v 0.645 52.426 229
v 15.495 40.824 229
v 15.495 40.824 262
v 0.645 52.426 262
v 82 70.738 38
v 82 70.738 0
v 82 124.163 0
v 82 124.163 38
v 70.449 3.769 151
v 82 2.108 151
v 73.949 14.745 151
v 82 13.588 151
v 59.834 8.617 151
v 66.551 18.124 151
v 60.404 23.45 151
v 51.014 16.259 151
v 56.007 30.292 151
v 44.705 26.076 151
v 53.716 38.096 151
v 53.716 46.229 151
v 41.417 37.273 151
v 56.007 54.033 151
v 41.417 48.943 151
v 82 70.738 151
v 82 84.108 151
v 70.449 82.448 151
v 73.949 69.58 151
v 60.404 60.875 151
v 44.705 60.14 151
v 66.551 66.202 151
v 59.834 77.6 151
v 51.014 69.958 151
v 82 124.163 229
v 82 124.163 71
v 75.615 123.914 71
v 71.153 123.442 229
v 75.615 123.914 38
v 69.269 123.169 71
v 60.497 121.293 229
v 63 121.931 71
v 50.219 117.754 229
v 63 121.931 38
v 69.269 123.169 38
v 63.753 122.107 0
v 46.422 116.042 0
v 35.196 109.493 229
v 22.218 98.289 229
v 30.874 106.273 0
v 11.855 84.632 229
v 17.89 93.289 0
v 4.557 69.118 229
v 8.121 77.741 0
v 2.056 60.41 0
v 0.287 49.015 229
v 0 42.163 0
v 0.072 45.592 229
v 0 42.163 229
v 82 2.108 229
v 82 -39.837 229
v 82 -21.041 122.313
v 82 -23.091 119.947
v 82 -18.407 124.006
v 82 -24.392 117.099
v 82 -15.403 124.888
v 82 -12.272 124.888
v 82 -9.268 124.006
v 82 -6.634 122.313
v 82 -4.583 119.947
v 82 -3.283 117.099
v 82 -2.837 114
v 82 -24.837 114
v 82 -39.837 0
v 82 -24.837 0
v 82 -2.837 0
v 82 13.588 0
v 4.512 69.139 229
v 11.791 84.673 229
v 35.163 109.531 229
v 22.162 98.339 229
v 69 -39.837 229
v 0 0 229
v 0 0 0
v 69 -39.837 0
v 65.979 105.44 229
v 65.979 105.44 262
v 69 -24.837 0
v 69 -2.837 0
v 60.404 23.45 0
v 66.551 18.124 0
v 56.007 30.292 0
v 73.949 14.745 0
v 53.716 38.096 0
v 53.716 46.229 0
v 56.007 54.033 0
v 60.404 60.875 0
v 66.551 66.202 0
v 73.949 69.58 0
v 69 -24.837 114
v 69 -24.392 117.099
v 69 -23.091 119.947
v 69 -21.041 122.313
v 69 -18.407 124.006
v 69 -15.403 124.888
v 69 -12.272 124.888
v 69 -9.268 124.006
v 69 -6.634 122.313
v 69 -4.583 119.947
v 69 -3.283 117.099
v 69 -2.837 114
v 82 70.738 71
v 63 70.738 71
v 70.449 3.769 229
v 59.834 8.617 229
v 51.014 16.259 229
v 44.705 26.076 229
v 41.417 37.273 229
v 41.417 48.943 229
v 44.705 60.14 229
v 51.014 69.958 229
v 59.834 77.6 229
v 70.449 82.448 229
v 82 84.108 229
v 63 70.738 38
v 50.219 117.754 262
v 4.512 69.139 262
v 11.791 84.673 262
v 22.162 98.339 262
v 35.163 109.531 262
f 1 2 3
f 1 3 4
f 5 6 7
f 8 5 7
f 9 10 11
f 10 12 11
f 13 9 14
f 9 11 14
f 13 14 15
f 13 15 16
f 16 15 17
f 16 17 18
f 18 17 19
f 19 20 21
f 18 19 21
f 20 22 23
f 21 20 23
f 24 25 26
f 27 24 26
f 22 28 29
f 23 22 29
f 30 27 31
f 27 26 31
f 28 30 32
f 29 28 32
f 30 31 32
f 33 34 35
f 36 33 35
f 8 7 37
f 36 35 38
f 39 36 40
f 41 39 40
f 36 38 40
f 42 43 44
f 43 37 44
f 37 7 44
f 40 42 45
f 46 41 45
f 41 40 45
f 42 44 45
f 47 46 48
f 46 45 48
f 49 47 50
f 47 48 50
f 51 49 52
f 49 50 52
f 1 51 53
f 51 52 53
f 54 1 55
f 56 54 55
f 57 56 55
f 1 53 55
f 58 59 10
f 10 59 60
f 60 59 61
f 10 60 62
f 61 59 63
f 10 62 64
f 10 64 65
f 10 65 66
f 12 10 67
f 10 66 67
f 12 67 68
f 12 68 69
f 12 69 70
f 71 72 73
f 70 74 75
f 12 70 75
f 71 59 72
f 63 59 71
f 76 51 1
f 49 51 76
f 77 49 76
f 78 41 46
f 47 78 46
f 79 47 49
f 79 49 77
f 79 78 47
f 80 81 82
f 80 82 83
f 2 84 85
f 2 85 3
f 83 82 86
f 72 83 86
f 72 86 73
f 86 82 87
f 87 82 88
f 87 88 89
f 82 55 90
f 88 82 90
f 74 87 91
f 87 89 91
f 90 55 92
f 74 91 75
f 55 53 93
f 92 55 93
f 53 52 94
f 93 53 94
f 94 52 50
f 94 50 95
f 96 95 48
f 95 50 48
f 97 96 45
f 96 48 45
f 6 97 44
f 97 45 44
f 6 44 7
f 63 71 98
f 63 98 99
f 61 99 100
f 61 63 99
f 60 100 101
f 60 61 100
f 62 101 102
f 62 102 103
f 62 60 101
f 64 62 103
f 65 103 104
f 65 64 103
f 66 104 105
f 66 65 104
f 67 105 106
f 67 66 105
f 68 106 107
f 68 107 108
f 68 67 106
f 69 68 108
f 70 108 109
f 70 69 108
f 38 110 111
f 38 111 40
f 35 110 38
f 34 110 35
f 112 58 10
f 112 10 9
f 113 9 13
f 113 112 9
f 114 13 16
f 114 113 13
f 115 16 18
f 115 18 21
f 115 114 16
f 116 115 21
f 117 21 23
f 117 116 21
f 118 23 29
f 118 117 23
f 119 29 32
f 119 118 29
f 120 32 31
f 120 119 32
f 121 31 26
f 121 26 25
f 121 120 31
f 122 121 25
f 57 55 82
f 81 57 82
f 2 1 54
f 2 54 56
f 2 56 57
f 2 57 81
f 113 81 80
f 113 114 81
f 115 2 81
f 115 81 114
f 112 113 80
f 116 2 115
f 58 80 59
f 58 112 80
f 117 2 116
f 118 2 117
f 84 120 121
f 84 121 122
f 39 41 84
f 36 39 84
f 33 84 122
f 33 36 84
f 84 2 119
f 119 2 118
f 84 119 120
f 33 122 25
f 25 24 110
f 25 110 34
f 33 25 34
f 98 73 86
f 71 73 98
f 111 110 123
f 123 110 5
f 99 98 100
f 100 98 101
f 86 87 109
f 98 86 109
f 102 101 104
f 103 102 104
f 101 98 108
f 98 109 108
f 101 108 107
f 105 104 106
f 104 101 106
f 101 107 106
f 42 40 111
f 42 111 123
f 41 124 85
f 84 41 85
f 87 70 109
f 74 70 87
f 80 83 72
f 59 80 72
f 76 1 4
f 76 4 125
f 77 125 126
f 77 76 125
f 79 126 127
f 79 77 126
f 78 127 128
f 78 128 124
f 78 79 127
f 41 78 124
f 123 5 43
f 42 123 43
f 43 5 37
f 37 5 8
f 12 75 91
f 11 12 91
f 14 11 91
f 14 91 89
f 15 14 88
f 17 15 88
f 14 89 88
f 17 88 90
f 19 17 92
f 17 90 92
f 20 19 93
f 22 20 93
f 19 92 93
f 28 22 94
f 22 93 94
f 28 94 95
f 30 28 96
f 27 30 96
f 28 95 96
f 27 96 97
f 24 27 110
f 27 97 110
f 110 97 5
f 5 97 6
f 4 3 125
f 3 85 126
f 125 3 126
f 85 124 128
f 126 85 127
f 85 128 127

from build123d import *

# Parameters (mm, degrees)
BOSS_EXTRUDE1_DEPTH = 229
BOSS_EXTRUDE3_DEPTH = 33
CUT_EXTRUDE1_DEPTH  = 78
SKETCH4_W           = 33
SKETCH4_H           = 53.425
CUT_EXTRUDE2_DEPTH  = 19
CUT_EXTRUDE3_DEPTH  = 13


with BuildPart() as part:
    # Sketch1 → Boss-Extrude1 (new body)
    with BuildSketch(Plane.XY):
        with BuildLine():
            Line((0, 42.162831426), (0, 0))
            Line((0, 0), (69, -39.837168574))
            Line((69, -39.837168574), (82, -39.837168574))
            Line((82, -39.837168574), (82, 13.587831426))
            ThreePointArc((82, 13.587831426), (53.425, 42.162831426), (82, 70.737831426))
            Line((82, 70.737831426), (82, 124.162831426))
            ThreePointArc((82, 124.162831426), (24.017243943, 100.145587483), (0, 42.162831426))
        make_face()
    extrude(amount=BOSS_EXTRUDE1_DEPTH)

    # Sketch2 → Boss-Extrude3 (add)
    with BuildSketch(Plane.XY.offset(229)):
        with BuildLine():
            Line((50.218978157, 117.75361559), (65.979193229, 105.440386084))
            Line((65.979193229, 105.440386084), (15.494952252, 40.823504288))
            Line((15.494952252, 40.823504288), (0.644773941, 52.425735154))
            ThreePointArc((0.644773941, 52.425735154), (16.616037222, 91.779593848), (50.218978157, 117.75361559))
        make_face()
    extrude(amount=BOSS_EXTRUDE3_DEPTH)

    # Sketch3 → Cut-Extrude1 (cut)
    with BuildSketch(Plane.XY.offset(229)):
        with BuildLine():
            Line((82, 84.108352132), (82, 2.108352132))
            ThreePointArc((82, 2.108352132), (41, 43.108352132), (82, 84.108352132))
        make_face()
    extrude(amount=-CUT_EXTRUDE1_DEPTH, mode=Mode.SUBTRACT)

    # Sketch4 → Cut-Extrude2 (cut)
    with BuildSketch(Plane(origin=(82, 0, 0), x_dir=(0, 0, -1), z_dir=(1, 0, 0))):
        with Locations((-54.5, 97.450331426)):
            Rectangle(SKETCH4_W, SKETCH4_H)
    extrude(amount=-CUT_EXTRUDE2_DEPTH, mode=Mode.SUBTRACT)

    # Sketch5 → Cut-Extrude3 (cut)
    with BuildSketch(Plane(origin=(82, 0, 0), x_dir=(0, 0, -1), z_dir=(1, 0, 0))):
        with BuildLine():
            Line((0, -24.837168574), (-114, -24.837168574))
            ThreePointArc((-114, -24.837168574), (-125, -13.837168574), (-114, -2.837168574))
            Line((-114, -2.837168574), (0, -2.837168574))
            ThreePointArc((0, -2.837168574), (11, -13.837168574), (0, -24.837168574))
        make_face()
    extrude(amount=-CUT_EXTRUDE3_DEPTH, mode=Mode.SUBTRACT)


solid = part.part
